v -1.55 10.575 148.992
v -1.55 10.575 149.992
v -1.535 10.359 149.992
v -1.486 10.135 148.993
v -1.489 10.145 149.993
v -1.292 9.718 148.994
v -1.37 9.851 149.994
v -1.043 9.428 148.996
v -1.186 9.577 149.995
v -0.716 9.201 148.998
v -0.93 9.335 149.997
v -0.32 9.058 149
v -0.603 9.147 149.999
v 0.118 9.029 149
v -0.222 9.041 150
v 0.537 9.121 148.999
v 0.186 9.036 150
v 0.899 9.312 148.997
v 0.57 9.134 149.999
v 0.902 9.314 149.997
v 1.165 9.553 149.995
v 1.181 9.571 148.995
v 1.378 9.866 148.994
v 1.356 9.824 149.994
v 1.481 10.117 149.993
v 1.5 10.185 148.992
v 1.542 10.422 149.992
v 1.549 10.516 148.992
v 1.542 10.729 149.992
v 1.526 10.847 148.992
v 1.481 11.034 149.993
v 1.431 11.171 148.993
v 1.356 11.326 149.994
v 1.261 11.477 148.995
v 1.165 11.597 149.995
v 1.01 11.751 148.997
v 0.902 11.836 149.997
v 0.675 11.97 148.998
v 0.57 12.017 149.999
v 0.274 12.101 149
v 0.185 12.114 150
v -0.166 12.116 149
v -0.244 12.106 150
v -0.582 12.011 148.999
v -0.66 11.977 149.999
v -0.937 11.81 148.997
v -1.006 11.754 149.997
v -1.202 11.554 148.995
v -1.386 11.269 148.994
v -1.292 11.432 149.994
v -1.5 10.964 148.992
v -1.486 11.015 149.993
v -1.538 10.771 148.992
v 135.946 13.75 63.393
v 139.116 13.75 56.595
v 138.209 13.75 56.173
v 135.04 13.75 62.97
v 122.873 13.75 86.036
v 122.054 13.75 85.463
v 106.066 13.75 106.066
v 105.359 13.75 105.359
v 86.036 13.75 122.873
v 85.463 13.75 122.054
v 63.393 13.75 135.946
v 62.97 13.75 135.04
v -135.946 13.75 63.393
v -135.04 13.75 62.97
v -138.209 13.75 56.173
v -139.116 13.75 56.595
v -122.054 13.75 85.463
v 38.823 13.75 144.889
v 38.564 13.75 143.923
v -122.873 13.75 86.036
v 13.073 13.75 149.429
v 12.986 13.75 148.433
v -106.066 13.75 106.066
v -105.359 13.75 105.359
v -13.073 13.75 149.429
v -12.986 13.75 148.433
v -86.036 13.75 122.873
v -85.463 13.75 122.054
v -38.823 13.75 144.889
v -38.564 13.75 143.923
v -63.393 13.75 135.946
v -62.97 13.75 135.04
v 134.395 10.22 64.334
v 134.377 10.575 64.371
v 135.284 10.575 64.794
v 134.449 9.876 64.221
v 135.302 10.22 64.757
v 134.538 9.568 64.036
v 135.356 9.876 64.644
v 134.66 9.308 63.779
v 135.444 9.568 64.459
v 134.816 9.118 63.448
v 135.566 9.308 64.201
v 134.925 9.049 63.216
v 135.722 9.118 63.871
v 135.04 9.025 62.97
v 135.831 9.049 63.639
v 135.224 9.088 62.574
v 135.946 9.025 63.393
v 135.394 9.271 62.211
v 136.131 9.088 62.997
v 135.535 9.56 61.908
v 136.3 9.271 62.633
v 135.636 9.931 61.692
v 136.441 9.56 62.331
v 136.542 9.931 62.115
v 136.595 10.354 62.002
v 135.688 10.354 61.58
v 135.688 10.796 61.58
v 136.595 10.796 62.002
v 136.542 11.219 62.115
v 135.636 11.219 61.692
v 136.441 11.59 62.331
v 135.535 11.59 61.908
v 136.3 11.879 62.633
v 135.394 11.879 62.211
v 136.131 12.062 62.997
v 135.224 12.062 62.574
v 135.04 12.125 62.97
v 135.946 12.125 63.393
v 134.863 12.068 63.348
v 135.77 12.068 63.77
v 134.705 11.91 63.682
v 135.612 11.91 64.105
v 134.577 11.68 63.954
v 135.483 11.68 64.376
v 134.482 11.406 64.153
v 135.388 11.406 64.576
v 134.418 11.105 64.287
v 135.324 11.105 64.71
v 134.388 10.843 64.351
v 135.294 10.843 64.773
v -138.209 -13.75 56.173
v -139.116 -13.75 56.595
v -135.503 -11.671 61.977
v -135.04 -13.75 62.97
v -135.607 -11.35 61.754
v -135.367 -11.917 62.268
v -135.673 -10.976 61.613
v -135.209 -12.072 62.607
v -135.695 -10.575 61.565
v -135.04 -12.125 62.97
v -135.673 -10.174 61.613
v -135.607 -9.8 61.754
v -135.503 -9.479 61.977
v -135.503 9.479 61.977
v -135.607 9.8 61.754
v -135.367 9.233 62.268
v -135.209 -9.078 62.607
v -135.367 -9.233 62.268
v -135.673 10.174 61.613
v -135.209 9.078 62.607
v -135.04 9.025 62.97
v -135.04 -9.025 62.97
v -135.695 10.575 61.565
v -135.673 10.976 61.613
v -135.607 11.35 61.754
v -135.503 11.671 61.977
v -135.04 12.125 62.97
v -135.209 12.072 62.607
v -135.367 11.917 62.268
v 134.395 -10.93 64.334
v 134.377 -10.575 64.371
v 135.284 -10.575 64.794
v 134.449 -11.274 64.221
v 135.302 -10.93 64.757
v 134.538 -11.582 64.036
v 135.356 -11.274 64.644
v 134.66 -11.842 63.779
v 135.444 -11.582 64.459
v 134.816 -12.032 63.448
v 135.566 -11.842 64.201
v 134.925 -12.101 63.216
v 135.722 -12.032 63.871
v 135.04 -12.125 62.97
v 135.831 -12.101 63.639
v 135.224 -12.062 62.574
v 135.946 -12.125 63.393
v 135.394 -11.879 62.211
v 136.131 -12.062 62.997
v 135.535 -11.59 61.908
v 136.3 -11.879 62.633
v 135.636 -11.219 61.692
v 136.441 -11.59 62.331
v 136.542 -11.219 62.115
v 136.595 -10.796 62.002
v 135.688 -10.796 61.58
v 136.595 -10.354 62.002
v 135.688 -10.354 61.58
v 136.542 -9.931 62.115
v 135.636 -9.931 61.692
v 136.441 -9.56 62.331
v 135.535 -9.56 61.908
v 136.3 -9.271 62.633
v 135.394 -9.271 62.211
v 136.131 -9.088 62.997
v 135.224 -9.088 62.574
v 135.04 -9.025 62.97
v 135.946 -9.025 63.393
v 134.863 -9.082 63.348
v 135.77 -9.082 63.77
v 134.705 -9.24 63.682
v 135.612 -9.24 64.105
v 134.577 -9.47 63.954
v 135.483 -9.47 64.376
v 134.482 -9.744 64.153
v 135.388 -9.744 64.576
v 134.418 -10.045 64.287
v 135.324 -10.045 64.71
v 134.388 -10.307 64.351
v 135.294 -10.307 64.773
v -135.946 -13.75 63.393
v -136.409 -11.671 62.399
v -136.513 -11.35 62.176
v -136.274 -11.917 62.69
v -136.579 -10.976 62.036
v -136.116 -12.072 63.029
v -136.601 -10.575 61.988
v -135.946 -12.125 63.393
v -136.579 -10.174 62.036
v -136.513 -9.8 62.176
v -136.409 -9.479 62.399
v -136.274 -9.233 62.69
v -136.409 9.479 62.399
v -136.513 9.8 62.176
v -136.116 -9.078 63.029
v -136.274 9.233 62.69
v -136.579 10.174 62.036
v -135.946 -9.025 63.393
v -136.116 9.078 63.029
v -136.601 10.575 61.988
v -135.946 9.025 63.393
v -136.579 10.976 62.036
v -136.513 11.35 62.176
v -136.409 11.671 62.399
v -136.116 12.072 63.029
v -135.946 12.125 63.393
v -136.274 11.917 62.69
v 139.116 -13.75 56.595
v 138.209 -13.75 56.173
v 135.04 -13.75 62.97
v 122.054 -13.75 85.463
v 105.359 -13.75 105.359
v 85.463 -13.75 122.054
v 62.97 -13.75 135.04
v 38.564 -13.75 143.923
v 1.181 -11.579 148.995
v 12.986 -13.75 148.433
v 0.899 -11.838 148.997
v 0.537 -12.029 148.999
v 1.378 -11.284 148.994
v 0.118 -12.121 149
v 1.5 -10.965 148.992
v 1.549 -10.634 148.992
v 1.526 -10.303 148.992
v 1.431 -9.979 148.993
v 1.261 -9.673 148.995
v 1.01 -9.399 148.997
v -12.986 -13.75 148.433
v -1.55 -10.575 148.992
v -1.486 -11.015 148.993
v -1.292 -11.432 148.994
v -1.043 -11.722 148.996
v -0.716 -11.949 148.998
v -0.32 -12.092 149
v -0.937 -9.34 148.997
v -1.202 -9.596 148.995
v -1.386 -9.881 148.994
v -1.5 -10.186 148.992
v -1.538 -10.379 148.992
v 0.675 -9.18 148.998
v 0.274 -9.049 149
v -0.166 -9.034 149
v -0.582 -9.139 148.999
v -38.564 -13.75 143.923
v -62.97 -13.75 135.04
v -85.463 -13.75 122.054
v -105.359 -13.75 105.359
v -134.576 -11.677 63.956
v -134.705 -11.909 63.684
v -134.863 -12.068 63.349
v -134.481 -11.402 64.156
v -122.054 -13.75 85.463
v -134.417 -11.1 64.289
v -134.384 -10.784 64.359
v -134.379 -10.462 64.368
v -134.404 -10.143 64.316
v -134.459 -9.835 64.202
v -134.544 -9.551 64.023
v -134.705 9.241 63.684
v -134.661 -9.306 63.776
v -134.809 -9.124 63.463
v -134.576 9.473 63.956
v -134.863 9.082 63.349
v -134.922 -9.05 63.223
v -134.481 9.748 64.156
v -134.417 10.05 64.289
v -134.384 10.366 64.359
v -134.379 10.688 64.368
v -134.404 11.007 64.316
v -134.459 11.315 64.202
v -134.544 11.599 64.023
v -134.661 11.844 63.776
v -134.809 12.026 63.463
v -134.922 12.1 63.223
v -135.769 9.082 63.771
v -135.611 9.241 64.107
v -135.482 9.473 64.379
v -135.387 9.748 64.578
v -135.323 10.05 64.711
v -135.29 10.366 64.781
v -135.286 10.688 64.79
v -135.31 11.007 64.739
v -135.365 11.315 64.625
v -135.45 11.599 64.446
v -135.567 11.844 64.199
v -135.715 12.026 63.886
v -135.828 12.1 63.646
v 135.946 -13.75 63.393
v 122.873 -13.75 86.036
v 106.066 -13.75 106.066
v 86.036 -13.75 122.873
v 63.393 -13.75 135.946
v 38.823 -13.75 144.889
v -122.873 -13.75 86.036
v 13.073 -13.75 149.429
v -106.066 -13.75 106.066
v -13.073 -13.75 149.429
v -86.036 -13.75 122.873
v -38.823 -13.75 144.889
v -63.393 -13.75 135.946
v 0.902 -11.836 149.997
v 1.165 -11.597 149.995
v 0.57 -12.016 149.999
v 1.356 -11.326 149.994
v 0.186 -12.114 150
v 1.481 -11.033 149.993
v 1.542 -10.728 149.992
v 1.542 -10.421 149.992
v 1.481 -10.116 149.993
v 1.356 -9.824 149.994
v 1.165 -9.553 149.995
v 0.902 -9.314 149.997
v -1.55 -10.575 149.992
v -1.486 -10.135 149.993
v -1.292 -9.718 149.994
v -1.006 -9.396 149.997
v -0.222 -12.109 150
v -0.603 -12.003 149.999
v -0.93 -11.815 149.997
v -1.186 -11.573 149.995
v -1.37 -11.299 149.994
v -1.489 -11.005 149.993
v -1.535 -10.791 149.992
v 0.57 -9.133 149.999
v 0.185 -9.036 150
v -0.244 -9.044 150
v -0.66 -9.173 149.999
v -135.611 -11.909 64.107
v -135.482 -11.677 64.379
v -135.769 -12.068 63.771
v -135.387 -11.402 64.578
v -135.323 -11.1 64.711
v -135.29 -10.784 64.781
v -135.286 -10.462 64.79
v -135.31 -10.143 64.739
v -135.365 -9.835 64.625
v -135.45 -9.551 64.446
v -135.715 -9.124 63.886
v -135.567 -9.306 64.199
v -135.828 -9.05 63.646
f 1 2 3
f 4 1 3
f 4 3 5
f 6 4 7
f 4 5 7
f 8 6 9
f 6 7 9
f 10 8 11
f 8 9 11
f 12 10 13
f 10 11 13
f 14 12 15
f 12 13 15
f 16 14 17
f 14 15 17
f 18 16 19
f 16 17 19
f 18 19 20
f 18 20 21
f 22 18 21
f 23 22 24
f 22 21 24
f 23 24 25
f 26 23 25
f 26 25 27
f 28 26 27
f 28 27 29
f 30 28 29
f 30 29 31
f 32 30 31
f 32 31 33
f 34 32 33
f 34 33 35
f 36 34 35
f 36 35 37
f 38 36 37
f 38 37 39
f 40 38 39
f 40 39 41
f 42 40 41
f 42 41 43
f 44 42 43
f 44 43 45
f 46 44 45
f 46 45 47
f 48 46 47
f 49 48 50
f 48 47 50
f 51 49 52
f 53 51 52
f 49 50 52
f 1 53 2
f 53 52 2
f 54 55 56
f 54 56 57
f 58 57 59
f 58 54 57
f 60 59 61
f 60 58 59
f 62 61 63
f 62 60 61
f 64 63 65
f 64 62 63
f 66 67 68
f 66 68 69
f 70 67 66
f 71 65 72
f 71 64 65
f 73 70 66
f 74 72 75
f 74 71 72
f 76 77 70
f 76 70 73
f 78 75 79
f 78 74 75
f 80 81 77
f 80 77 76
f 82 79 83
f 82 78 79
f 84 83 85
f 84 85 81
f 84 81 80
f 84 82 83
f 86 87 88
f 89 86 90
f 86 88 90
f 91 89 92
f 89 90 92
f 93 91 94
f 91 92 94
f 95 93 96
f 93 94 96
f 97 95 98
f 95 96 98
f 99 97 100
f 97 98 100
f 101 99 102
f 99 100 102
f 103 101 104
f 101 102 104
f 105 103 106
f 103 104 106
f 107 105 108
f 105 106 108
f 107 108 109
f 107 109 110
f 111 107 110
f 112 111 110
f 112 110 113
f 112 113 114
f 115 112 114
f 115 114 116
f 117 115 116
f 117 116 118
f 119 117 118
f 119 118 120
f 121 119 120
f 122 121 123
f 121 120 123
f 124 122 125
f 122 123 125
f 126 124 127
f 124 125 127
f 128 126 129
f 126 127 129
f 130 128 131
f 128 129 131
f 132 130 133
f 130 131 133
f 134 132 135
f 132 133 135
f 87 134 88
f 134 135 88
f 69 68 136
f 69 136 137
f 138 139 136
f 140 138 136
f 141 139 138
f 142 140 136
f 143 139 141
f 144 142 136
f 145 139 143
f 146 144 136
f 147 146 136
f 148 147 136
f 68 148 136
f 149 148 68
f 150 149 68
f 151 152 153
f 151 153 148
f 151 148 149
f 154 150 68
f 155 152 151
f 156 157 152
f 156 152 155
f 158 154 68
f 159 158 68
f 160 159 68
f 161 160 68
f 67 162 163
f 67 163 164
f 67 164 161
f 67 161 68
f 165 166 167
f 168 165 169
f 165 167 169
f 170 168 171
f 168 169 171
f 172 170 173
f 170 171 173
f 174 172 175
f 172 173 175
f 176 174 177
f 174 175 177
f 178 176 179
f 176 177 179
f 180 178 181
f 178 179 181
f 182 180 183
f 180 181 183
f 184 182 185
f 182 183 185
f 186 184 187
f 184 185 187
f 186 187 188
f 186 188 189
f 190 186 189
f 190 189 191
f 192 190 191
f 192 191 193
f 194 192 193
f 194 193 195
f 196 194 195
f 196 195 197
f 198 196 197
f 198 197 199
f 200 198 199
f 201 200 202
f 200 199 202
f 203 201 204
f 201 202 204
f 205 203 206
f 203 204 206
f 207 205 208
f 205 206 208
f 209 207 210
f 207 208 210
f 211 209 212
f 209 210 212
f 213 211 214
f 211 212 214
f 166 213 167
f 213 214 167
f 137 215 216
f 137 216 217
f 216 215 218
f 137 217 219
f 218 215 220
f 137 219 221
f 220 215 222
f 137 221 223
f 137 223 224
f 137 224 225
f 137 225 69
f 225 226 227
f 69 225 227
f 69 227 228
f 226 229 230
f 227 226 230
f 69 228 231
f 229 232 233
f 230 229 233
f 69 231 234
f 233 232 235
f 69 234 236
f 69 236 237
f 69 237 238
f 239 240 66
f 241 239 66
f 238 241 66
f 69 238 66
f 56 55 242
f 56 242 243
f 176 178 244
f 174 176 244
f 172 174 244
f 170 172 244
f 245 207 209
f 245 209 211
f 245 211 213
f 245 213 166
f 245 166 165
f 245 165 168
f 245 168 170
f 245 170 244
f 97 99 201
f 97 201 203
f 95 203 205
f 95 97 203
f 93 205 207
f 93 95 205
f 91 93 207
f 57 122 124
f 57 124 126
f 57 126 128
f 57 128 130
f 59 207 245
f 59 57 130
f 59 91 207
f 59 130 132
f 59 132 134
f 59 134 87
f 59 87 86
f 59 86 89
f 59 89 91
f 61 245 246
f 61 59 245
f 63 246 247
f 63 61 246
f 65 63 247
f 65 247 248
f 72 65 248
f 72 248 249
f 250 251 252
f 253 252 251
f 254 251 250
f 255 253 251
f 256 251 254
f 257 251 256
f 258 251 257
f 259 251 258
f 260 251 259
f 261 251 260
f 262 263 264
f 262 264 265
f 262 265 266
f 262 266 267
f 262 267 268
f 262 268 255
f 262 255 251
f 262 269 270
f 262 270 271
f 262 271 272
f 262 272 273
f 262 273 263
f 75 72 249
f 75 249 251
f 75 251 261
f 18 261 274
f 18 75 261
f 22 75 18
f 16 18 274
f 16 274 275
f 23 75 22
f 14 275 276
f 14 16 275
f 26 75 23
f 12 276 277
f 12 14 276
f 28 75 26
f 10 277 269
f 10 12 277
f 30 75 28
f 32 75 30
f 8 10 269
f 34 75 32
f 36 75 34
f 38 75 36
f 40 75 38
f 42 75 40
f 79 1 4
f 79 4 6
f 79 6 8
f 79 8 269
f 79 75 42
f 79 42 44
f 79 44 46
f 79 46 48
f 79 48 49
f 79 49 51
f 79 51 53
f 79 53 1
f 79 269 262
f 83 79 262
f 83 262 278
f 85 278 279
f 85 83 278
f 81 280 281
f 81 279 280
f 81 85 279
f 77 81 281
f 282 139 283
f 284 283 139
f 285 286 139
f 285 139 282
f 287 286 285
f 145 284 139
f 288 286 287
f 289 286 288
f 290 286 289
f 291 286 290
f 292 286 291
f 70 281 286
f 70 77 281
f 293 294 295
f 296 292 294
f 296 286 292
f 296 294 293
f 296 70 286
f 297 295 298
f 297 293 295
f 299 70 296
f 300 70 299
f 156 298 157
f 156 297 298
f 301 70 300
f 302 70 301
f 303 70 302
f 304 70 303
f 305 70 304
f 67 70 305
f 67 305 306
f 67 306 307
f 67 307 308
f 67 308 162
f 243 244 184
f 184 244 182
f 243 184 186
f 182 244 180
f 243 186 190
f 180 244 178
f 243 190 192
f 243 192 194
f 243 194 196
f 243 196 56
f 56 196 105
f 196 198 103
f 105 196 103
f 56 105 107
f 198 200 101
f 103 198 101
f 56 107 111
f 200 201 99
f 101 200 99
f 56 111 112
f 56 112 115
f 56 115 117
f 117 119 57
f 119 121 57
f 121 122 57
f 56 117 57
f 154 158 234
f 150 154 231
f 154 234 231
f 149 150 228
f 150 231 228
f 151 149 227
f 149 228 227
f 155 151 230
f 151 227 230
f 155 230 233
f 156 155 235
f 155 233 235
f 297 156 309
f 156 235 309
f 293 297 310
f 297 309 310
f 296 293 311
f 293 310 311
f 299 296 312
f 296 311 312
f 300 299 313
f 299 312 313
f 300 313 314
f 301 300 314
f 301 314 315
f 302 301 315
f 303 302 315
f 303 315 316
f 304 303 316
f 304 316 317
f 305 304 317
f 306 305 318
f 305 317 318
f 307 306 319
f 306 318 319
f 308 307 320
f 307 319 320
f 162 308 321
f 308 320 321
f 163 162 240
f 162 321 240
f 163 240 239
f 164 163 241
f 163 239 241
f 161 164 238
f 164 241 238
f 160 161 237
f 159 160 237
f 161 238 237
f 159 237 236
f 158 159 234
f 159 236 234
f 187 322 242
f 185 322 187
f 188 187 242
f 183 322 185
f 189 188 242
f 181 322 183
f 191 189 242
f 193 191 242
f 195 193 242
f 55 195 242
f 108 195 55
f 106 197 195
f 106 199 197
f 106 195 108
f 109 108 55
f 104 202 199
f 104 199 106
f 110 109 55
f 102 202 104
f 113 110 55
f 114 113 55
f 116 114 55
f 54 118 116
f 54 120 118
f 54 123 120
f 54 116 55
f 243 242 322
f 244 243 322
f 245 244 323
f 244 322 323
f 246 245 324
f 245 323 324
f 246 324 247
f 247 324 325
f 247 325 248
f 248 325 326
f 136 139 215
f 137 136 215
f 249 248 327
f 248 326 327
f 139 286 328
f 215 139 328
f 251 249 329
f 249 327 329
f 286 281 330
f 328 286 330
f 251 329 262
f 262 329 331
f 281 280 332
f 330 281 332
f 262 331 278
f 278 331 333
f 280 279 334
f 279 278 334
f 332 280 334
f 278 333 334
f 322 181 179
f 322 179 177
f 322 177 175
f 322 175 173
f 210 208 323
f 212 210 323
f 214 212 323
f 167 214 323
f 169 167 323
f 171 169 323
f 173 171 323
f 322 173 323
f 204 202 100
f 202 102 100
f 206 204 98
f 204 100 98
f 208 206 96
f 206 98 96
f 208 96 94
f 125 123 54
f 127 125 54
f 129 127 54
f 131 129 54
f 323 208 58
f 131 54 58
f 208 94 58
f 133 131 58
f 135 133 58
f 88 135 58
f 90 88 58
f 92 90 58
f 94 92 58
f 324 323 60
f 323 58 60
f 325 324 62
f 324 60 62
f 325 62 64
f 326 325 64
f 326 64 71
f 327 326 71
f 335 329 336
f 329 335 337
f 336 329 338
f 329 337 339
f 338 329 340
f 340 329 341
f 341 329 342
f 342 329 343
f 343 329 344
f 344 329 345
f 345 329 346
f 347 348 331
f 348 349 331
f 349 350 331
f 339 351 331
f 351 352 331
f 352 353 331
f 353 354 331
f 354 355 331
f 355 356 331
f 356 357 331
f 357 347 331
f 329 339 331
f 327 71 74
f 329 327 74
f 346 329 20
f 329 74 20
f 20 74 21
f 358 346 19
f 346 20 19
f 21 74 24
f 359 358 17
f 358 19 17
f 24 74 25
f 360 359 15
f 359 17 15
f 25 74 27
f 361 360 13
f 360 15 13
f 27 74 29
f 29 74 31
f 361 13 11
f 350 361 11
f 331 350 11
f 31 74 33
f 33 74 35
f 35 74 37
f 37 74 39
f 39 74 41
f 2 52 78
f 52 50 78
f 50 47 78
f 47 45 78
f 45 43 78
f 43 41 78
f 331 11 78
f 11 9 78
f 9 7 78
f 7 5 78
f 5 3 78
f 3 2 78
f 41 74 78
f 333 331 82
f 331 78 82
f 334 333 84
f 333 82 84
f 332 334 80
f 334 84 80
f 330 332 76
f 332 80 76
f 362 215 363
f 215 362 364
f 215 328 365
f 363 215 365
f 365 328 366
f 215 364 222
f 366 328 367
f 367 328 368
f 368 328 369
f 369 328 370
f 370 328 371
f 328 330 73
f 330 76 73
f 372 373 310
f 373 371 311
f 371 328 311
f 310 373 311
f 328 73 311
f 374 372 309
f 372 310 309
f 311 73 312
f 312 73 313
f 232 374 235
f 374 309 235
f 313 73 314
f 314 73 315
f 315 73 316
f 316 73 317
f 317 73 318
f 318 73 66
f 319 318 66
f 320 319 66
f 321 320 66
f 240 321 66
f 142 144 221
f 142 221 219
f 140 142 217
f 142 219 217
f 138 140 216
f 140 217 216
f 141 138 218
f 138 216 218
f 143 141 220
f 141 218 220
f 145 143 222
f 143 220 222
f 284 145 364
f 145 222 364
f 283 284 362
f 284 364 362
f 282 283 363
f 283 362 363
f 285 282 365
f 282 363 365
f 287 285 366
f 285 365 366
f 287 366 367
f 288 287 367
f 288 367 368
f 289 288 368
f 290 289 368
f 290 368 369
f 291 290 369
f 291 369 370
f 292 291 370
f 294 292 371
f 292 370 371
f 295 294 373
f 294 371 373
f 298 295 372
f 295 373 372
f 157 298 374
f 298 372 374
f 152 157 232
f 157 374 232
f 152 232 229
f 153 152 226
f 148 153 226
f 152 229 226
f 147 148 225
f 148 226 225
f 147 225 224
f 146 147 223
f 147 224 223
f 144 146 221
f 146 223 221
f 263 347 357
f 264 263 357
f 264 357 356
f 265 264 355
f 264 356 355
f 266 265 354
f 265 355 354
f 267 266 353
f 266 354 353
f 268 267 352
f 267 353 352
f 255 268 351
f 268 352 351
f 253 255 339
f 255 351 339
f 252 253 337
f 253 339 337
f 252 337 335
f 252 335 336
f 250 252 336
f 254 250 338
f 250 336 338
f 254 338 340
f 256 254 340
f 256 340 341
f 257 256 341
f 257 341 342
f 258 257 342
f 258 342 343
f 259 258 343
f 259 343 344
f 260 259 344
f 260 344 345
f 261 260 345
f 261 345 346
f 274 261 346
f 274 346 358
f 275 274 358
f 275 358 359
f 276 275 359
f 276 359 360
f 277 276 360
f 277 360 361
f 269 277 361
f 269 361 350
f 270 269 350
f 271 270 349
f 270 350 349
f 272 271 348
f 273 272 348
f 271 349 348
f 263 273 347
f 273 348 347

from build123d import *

# Parameters (mm, degrees)
SKETCH2_W                       = 1
SKETCH2_H                       = 27.5
REVOLVE1_ANGLE                  = 130
SKETCH3_W                       = 1
SKETCH3_H                       = 27.5
BOSS_EXTRUDE1_DEPTH             = 7.5
SKETCH4_W                       = 1
SKETCH4_H                       = 27.5
BOSS_EXTRUDE2_DEPTH             = 7.5
M2_5_CLEARANCE_HOLE1_D          = 3.1
CIRPATTERN1_COUNT               = 2
CIRPATTERN1_ANGLE               = 65
CIRPATTERN1_THE_OTHER_WAY_COUNT = 2
CIRPATTERN1_THE_OTHER_WAY_ANGLE = 65


with BuildPart() as part:
    # Sketch2 → Revolve1 (revolve, symmetric)
    with BuildSketch(Plane(origin=(0, 0, 0), x_dir=(0, 0, -1), z_dir=(1, 0, 0))) as revolve1_sk:
        with Locations((-149.5, 0)):
            Rectangle(SKETCH2_W, SKETCH2_H)
    revolve(axis=Axis((0, -1000, 0), (0, 1, 0)), revolution_arc=REVOLVE1_ANGLE / 2)
    revolve(revolve1_sk.sketch, axis=Axis((0, -1000, 0), (0, -1, 0)), revolution_arc=REVOLVE1_ANGLE / 2)

    # Sketch3 → Boss-Extrude1 (add)
    with BuildSketch(Plane(origin=(0, 0, 0), x_dir=(-0.9063077870366509, 1.4496858692468702e-15, -0.4226182617406975), z_dir=(0.4226182617406975, 3.1088613791648487e-15, -0.9063077870366509))):
        with Locations((-149.5, 0)):
            Rectangle(SKETCH3_W, SKETCH3_H)
    extrude(amount=BOSS_EXTRUDE1_DEPTH)

    # Sketch4 → Boss-Extrude2 (add)
    with BuildSketch(Plane(origin=(0, 0, 0), x_dir=(-0.906307787036651, -1.4496858692468694e-15, 0.4226182617406973), z_dir=(-0.4226182617406973, 3.1088613791648455e-15, -0.906307787036651))):
        with Locations((149.5, 0)):
            Rectangle(SKETCH4_W, SKETCH4_H)
    extrude(amount=BOSS_EXTRUDE2_DEPTH)

    # M2.5 Clearance Hole1 (through all)
    with Locations(Plane(origin=(0, 0, 0), x_dir=(1, 0, 0), z_dir=(0, 0, -1))):
        with Locations((0, -10.575), (0, 10.575)):
            m2_5_clearance_hole1 = Hole(M2_5_CLEARANCE_HOLE1_D / 2)

    # CirPattern1: M2.5 Clearance Hole1 ×2 about axis
    cirpattern1_axis = Axis((0, -1000, 0), (0, 1, 0))
    for i in range(1, CIRPATTERN1_COUNT):
        add(m2_5_clearance_hole1.rotate(cirpattern1_axis, i * CIRPATTERN1_ANGLE / (CIRPATTERN1_COUNT - 1)), mode=Mode.SUBTRACT)

    # CirPattern1 the other way: M2.5 Clearance Hole1 ×2 about axis
    cirpattern1_the_other_way_axis = Axis((0, -1000, 0), (0, -1, 0))
    for i in range(1, CIRPATTERN1_THE_OTHER_WAY_COUNT):
        add(m2_5_clearance_hole1.rotate(cirpattern1_the_other_way_axis, i * CIRPATTERN1_THE_OTHER_WAY_ANGLE / (CIRPATTERN1_THE_OTHER_WAY_COUNT - 1)), mode=Mode.SUBTRACT)


solid = part.part
